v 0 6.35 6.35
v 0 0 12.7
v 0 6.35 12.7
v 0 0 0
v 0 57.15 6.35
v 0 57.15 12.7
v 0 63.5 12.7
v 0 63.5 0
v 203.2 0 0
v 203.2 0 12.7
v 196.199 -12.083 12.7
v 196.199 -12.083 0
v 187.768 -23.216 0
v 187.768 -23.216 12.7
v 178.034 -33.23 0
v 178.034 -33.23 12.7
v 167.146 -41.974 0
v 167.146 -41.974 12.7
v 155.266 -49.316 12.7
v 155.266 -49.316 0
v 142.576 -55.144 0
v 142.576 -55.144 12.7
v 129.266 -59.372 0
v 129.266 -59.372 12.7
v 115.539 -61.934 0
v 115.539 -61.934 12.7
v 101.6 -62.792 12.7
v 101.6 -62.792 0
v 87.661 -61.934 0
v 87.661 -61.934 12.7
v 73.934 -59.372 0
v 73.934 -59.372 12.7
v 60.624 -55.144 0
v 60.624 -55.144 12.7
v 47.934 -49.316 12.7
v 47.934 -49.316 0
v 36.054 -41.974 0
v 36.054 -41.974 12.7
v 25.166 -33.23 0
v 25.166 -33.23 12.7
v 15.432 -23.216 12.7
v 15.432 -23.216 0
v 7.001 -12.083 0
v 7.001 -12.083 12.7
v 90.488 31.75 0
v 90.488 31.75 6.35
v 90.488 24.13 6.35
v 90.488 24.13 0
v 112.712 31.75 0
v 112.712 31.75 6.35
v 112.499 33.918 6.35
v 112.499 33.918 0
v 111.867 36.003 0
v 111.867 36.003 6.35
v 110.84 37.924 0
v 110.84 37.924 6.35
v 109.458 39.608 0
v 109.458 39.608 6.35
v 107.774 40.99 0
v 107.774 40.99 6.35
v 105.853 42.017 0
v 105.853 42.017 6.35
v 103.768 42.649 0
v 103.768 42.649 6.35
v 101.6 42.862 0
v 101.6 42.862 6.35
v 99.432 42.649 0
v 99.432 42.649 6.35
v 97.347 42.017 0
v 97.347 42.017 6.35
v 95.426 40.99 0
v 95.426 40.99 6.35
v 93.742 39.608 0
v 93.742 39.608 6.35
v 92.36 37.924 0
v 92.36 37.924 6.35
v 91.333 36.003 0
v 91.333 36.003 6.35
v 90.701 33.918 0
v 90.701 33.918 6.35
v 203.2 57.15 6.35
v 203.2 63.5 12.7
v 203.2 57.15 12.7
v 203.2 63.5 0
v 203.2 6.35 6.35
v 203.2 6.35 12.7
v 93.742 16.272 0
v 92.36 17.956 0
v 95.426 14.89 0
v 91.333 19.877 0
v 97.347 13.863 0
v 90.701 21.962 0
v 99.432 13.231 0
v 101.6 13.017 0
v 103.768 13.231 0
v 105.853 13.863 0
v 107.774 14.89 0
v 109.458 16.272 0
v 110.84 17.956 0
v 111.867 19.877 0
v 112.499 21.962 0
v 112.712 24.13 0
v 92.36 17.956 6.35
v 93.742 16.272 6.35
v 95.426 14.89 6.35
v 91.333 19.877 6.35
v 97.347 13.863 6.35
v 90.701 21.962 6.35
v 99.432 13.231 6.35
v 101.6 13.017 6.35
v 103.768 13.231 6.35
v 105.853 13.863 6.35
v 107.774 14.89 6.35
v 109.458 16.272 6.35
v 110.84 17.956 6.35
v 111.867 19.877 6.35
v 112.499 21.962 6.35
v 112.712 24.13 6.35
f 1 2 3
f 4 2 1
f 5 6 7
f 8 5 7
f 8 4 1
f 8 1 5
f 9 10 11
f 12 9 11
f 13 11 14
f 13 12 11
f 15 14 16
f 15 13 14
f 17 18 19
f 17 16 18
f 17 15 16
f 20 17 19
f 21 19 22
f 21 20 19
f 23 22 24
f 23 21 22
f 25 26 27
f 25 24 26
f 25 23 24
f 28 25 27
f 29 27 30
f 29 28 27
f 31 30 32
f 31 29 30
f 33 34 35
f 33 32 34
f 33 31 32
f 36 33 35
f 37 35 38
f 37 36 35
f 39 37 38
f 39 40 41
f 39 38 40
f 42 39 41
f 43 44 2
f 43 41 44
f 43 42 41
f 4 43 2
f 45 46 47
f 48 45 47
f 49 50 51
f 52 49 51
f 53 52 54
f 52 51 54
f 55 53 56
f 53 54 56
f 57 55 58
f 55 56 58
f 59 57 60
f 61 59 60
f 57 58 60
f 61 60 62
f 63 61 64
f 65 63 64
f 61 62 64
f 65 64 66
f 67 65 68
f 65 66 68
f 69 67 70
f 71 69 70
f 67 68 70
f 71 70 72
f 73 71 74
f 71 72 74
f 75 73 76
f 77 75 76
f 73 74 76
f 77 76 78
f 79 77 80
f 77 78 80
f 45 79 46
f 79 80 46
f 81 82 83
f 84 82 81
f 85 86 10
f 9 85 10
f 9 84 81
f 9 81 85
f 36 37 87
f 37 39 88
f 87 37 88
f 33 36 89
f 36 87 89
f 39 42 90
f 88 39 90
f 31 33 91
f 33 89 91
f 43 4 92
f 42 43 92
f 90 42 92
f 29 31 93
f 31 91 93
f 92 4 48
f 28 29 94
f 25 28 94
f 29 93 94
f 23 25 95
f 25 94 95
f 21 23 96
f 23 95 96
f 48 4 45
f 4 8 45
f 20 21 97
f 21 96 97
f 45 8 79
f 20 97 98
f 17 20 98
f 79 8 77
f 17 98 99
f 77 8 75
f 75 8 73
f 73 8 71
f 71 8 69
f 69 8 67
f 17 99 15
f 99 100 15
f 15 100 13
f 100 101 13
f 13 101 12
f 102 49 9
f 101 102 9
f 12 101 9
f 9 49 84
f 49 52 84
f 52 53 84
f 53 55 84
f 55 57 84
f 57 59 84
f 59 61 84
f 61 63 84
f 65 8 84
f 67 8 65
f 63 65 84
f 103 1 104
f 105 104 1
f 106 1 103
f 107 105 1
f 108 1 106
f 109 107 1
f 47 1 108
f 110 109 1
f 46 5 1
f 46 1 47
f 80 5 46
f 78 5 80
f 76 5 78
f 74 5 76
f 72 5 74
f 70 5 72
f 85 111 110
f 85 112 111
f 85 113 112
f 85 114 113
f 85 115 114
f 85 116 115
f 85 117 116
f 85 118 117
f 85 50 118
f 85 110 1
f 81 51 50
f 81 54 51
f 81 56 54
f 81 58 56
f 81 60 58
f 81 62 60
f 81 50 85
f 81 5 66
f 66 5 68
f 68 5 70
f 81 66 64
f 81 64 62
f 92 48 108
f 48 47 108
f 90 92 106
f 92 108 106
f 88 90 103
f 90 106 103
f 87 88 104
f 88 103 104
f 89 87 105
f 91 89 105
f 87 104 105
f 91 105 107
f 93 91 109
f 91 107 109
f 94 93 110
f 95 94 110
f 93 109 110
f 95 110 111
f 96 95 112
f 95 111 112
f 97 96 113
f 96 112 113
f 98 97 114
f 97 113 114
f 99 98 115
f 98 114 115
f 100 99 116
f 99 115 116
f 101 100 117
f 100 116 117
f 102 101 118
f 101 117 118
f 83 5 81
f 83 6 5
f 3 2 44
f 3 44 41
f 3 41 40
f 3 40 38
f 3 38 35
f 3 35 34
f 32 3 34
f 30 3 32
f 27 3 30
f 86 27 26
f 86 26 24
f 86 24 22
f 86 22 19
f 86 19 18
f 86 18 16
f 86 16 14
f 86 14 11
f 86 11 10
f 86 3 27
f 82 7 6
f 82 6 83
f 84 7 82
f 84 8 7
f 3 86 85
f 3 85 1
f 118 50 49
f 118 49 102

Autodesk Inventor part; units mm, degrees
ref_plane "YZ Plane" through (0, 0, 0) normal (1, 0, 0) x (0, 1, 0)
ref_plane "XZ Plane" through (0, 0, 0) normal (0, 1, 0) x (-1, 0, 0)
ref_plane "XY Plane" through (0, 0, 0) normal (0, 0, 1) x (1, 0, 0)
sketch "Sketch1" plane through (0, 0, 0) normal (0, 0, 1) x (1, 0, 0)
  line L0 (0, 0) -> (0, 63.5)
  line L1 (0, 63.5) -> (203.2, 63.5)
  line L2 (203.2, 63.5) -> (203.2, 0)
  line L3 (0, 0) -> (203.2, 0)
  dimension "d0" = 63.5
  dimension "d1" = 203.2
extrude "Extrusion1" add sketch "Sketch1" along normal blind 12.7
sketch "Sketch2" plane through (0, 0, 12.7) normal (0, 0, 1) x (1, 0, 0)
  line L0 (0, 63.5) -> (0, 0) projected
  line L1 (203.2, 0) -> (203.2, 63.5) projected
  line L2 (0, 57.15) -> (203.2, 57.15)
  line L3 (203.2, 57.15) -> (203.2, 6.35)
  line L4 (203.2, 6.35) -> (0, 6.35)
  line L5 (0, 6.35) -> (0, 57.15)
  line L6 (0, 63.5) -> (203.2, 63.5) projected
  line L7 (203.2, 0) -> (0, 0) projected
  dimension "d4" = 6.35
  dimension "d5" = 6.35
extrude "Extrusion2" cut sketch "Sketch2" against normal blind 6.35 contours L2 L1 L4 L0
sketch "Sketch3" plane through (0, 0, 6.35) normal (0, 0, 1) x (1, 0, 0)
  arc A0 (0, 0) -> (203.2, 0) centre (101.6, 50.8) ccw
  line L0 (0, 0) -> (203.2, 0) projected
  dimension "d8" = 50.8
extrude "Extrusion3" add sketch "Sketch3" along normal mid plane 12.7
sketch "Sketch4" plane through (0, 0, 6.35) normal (0, 0, 1) x (1, 0, 0)
  circle A0 centre (101.6, 31.75) radius 11.1125
  circle A1 centre (101.6, 24.13) radius 11.1125
  line L0 (203.2, 57.15) -> (203.2, 6.35) projected
  line L1 (0, 57.15) -> (203.2, 57.15) projected
  line L2 (90.4875, 31.75) -> (90.4875, 24.13)
  line L3 (112.7125, 31.75) -> (112.7125, 24.13)
  point P0 (0, 0)
  dimension "d11" = 101.6
  dimension "d12" = 101.6
  dimension "d13" = 22.225
  dimension "d14" = 7.62
  dimension "d15" = 22.225
  dimension "d16" = 25.4
extrude "Extrusion4" cut sketch "Sketch4" against normal blind 12.7
properties part number "C11_ZP_middle wheel plate"
